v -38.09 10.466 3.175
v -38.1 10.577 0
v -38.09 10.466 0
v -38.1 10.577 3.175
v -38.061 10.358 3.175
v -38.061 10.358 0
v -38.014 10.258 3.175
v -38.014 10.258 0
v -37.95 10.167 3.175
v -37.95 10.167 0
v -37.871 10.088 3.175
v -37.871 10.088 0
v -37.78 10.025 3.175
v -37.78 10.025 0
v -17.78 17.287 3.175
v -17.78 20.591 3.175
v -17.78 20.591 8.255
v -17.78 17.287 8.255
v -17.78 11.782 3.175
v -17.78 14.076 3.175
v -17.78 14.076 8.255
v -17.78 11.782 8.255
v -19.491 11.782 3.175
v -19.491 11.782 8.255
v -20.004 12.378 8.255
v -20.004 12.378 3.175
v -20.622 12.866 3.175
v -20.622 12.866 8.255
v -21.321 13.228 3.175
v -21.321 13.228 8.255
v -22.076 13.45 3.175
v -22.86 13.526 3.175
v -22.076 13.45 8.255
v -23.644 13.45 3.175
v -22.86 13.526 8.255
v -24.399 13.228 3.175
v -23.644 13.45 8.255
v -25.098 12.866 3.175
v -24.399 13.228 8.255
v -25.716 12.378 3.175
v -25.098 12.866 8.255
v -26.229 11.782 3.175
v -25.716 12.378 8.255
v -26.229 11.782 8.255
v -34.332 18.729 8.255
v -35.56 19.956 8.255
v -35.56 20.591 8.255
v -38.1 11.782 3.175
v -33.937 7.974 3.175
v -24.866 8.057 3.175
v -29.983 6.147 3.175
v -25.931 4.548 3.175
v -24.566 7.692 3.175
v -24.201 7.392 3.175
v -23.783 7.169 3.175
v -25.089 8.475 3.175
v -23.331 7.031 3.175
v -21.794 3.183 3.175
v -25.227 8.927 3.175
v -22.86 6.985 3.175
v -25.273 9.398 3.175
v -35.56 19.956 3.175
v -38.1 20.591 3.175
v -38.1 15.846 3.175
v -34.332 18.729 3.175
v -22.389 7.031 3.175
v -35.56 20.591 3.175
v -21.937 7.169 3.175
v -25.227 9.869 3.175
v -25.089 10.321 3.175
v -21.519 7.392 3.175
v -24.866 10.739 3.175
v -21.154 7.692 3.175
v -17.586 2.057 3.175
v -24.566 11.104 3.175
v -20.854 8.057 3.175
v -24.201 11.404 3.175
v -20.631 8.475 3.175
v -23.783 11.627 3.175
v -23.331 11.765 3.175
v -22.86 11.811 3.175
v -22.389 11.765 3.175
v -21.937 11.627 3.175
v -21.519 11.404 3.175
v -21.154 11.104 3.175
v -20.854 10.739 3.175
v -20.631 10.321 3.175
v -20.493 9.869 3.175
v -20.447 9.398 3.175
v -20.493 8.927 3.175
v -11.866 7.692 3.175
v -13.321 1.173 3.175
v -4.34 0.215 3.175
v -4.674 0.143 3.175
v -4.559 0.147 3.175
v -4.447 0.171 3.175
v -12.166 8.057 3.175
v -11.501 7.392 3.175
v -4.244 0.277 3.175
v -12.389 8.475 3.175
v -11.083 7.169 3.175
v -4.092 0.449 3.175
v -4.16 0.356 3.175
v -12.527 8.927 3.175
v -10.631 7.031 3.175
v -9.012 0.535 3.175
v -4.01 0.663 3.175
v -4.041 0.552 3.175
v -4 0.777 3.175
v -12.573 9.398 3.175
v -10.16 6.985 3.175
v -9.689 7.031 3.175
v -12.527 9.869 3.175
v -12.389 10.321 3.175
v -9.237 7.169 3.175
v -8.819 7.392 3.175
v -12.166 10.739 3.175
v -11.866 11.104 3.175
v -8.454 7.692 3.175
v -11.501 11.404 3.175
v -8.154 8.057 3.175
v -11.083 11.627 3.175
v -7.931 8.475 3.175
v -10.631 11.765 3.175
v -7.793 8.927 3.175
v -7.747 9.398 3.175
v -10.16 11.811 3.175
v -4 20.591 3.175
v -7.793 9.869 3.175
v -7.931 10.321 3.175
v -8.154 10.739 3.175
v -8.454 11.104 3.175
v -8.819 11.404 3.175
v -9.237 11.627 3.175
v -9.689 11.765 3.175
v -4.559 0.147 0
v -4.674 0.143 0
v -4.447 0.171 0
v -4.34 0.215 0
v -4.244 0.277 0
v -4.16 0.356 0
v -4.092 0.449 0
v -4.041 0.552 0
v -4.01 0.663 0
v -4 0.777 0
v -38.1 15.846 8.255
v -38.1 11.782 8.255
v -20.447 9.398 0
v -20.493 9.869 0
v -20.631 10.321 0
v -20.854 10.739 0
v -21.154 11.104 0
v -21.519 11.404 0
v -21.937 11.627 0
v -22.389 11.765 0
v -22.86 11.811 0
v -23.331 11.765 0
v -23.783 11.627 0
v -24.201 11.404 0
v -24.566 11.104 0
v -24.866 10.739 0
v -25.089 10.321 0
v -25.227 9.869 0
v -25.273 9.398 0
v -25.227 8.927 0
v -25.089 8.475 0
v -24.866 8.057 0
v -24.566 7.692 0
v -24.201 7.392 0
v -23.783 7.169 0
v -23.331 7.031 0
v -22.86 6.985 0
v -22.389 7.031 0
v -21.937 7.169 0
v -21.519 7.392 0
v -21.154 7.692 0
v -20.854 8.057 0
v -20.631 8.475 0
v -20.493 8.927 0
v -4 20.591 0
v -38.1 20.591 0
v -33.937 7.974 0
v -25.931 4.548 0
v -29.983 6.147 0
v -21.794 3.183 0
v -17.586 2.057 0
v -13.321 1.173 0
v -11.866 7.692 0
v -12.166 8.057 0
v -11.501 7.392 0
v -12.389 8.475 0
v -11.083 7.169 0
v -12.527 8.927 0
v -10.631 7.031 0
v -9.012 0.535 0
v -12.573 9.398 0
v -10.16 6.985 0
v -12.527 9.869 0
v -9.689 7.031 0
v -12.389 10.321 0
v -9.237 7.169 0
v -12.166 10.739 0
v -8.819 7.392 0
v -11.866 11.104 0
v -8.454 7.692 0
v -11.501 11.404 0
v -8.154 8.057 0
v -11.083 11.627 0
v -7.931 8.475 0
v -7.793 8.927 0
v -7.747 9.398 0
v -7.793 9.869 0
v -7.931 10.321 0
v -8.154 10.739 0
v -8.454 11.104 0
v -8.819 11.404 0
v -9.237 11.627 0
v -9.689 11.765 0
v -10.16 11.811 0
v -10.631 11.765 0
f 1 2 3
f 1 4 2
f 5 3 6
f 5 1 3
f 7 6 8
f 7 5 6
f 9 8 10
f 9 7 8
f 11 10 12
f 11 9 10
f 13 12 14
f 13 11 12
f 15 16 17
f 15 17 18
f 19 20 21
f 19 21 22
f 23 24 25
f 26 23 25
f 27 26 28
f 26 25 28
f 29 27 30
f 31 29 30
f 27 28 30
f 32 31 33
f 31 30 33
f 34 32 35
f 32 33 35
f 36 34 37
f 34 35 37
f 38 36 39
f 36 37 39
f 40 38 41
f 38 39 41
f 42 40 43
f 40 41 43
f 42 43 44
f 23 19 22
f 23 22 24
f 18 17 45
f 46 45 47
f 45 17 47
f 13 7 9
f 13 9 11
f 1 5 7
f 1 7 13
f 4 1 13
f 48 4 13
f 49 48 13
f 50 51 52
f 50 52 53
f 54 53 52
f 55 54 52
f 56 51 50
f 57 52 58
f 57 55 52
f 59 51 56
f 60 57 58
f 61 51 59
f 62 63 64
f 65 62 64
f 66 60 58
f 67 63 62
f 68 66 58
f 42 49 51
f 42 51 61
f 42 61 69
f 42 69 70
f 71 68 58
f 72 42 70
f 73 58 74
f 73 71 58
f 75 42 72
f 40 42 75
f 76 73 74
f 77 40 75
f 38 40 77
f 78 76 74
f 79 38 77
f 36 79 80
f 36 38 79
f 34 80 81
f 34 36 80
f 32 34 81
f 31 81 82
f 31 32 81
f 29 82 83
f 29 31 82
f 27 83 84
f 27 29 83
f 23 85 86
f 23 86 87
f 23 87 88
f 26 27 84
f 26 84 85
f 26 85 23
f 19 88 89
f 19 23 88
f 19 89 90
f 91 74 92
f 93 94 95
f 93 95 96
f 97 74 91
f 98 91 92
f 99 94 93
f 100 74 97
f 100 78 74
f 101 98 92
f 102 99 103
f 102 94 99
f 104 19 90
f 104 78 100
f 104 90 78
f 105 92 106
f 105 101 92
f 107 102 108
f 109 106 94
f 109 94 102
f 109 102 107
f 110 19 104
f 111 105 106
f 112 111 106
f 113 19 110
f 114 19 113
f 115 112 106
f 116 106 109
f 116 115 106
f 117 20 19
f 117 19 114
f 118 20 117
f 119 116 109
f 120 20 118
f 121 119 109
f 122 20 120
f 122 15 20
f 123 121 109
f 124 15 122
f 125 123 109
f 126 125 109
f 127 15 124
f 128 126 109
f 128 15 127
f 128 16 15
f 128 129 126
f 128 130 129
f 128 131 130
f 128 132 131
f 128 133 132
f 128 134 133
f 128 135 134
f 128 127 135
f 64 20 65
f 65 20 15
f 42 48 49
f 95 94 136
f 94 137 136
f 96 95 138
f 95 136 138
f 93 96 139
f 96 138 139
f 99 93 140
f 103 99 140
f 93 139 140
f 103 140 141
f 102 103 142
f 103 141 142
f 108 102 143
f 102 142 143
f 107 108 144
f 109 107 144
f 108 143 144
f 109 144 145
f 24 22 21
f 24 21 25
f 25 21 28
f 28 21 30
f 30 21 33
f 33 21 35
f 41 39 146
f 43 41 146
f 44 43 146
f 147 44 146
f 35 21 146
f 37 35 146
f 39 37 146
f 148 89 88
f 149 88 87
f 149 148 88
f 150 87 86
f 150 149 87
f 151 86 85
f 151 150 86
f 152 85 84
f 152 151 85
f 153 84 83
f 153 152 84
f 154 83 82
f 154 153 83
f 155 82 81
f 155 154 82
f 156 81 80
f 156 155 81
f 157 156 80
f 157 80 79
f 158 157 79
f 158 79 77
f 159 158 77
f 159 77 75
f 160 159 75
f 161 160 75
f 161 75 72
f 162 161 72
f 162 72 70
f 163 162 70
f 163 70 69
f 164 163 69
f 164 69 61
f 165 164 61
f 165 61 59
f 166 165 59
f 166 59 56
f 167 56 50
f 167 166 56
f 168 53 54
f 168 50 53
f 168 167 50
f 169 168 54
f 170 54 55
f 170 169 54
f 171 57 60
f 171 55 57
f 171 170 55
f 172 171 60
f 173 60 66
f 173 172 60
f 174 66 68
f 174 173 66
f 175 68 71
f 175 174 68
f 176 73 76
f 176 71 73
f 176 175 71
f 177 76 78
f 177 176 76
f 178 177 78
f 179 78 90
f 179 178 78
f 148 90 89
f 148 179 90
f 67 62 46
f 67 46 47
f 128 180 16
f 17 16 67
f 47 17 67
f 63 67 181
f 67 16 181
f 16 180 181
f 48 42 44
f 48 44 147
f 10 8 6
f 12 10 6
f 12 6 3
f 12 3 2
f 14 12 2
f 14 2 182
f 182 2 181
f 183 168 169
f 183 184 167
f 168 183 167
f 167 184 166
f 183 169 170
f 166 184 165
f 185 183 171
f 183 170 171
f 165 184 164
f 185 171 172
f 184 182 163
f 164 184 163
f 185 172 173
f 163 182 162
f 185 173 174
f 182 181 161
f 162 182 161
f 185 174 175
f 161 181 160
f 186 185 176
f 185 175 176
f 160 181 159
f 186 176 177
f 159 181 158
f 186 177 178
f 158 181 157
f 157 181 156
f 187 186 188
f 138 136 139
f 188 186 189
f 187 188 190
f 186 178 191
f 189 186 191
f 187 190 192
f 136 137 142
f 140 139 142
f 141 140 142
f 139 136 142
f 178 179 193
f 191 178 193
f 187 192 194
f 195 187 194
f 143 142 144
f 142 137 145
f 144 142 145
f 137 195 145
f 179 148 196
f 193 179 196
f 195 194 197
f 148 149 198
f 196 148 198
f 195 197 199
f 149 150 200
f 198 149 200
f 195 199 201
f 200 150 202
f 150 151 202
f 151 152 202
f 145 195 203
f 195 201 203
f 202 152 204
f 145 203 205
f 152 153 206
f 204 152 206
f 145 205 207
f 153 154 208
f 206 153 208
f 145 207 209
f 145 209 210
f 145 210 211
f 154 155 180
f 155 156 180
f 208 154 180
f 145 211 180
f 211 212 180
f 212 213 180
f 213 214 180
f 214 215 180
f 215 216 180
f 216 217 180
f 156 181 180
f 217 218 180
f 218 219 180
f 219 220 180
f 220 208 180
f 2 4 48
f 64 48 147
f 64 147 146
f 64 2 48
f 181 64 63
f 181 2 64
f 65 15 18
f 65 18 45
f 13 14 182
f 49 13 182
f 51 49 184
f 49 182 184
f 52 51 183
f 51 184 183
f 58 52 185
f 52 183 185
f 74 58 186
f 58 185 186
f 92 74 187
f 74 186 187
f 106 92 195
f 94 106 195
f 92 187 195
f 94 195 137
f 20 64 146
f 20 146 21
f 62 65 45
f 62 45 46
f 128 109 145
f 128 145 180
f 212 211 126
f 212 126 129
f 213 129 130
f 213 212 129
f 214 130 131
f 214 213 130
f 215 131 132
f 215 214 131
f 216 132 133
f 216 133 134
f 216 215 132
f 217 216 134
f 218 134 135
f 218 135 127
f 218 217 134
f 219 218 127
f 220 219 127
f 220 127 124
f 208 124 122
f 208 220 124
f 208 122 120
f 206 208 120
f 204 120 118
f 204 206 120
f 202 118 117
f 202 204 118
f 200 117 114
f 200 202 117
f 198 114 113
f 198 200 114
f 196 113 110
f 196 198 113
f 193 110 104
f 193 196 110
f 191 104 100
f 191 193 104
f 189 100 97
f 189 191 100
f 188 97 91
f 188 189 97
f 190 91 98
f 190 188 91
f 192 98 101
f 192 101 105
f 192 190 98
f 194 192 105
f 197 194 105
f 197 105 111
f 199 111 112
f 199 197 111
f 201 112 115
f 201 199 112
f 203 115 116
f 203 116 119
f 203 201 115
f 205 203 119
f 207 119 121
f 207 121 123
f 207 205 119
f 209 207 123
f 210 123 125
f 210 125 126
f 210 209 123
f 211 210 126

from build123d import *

# Parameters (mm, degrees)
SKETCH1_R           = 2.413
BOSS_EXTRUDE1_DEPTH = 3.175
BOSS_EXTRUDE2_DEPTH = 5.08
SKETCH4_W           = 4
SKETCH4_H           = 24.78484928
CUT_EXTRUDE2_DEPTH  = 5.08
FILLET1_R           = 0.635
SKETCH5_R           = 4.1275
CUT_EXTRUDE3_DEPTH  = 5.08


with BuildPart() as part:
    # Sketch1 → Boss-Extrude1 (new body)
    with BuildSketch(Plane.XY):
        with BuildLine():
            Line((0, 20.591373255), (-38.1, 20.591373255))
            Line((-38.1, 20.591373255), (-38.1, 10.208864232))
            ThreePointArc((-38.1, 10.208864232), (-19.722011237, 2.596452037), (0, 0))
            Line((0, 0), (0, 20.591373255))
        make_face()
        with Locations((-10.16, 9.398)):
            Circle(SKETCH1_R, mode=Mode.SUBTRACT)
        with Locations((-22.86, 9.398)):
            Circle(SKETCH1_R, mode=Mode.SUBTRACT)
    extrude(amount=BOSS_EXTRUDE1_DEPTH)

    # Sketch2 → Boss-Extrude2 (add)
    with BuildSketch(Plane.XY.offset(3.175)):
        Polygon((-38.1, 15.846028276), (-17.78, 14.075883223), (-17.78, 11.782028276), (-38.1, 11.782028276), align=None)
        Polygon((-17.78, 17.286663737), (-34.332210433, 18.728583688), (-35.56, 19.956373255), (-35.56, 20.591373255), (-17.78, 20.591373255), align=None)
    extrude(amount=BOSS_EXTRUDE2_DEPTH)

    # Sketch4 → Cut-Extrude2 (cut)
    with BuildSketch(Plane.XY.offset(3.175)):
        with Locations((-2, 12.39242464)):
            Rectangle(SKETCH4_W, SKETCH4_H)
    extrude(amount=-CUT_EXTRUDE2_DEPTH, mode=Mode.SUBTRACT)

    # Fillet1
    fillet1_edges = [part.edges().sort_by_distance(p)[0] for p in [
        (-4, 0.105059301, 1.5875),
        (-38.1, 10.208864232, 1.5875),
    ]]
    fillet(fillet1_edges, radius=FILLET1_R)

    # Sketch5 → Cut-Extrude3 (cut)
    with BuildSketch(Plane.XY.offset(8.255)):
        with Locations((-22.86, 9.398)):
            Circle(SKETCH5_R)
    extrude(amount=-CUT_EXTRUDE3_DEPTH, mode=Mode.SUBTRACT)


solid = part.part
